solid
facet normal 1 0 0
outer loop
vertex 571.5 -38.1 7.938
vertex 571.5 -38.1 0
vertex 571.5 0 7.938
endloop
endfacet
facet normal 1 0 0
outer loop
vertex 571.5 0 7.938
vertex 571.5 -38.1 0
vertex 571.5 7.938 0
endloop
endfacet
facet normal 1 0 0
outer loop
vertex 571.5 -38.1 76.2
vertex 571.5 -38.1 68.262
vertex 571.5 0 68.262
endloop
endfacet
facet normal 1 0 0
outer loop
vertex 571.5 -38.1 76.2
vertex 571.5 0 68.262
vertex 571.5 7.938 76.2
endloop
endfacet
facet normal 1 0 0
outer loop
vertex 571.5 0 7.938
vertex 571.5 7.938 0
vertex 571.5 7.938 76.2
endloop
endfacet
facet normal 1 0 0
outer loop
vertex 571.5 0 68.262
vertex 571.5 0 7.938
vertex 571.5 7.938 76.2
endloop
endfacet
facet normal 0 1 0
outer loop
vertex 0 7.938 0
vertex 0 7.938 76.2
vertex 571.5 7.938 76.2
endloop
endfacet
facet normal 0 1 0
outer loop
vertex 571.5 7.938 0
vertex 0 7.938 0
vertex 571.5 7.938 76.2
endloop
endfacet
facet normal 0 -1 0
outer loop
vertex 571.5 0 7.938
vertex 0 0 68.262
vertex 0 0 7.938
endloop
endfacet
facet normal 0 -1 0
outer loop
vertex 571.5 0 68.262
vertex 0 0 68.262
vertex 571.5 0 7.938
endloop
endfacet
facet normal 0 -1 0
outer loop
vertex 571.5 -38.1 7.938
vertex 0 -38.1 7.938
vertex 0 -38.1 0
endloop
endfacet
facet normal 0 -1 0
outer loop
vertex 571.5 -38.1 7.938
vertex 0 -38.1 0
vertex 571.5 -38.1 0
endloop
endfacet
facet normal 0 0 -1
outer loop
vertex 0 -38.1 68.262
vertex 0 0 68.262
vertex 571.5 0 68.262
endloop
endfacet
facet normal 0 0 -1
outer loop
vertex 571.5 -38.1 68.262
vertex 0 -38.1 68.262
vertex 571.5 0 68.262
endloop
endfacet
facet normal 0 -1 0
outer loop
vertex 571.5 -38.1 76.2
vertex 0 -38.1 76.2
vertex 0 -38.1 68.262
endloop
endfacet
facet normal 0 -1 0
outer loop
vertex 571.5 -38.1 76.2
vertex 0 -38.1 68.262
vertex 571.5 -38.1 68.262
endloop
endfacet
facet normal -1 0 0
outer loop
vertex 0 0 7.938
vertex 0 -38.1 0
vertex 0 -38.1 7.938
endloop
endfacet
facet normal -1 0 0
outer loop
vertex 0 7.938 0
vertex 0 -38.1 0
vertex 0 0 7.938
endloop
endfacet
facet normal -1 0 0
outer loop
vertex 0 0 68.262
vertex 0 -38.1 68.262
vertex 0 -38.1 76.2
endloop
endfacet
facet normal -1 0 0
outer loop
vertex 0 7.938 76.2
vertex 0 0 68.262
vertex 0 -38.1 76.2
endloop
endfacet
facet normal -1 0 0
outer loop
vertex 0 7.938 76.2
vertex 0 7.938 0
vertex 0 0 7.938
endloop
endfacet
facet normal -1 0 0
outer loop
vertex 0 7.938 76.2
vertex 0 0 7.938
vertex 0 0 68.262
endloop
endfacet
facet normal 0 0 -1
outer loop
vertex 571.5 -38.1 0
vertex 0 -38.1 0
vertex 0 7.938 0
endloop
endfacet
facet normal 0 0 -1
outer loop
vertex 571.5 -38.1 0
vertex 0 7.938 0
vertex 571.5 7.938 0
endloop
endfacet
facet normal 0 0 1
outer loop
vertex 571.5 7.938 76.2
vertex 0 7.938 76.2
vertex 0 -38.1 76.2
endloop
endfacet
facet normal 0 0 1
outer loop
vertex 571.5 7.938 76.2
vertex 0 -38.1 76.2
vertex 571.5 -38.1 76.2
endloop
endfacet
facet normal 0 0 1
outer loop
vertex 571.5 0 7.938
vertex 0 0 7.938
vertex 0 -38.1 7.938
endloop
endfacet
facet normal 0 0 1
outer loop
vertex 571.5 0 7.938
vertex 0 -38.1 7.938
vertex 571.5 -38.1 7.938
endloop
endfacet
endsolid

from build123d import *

# Parameters (mm, degrees)
F0_W     = 571.5
F0_H     = 76.2
F1_DEPTH = 7.9375
F2_W     = 571.5
F2_H     = 7.9375
F3_DEPTH = 38.1


with BuildPart() as f1:
    # F0 (on Front) → F1 (new body)
    with BuildSketch(Plane.XZ):
        with Locations((285.75, 38.1)):
            Rectangle(F0_W, F0_H)
    extrude(amount=-F1_DEPTH)

    # F2 (on Front) → F3 (join)
    with BuildSketch(Plane.XZ):
        with Locations((285.75, 72.23125)):
            Rectangle(F2_W, F2_H)
        with Locations((285.75, 3.96875)):
            Rectangle(F2_W, F2_H)
    extrude(amount=F3_DEPTH)


solid = f1.part
